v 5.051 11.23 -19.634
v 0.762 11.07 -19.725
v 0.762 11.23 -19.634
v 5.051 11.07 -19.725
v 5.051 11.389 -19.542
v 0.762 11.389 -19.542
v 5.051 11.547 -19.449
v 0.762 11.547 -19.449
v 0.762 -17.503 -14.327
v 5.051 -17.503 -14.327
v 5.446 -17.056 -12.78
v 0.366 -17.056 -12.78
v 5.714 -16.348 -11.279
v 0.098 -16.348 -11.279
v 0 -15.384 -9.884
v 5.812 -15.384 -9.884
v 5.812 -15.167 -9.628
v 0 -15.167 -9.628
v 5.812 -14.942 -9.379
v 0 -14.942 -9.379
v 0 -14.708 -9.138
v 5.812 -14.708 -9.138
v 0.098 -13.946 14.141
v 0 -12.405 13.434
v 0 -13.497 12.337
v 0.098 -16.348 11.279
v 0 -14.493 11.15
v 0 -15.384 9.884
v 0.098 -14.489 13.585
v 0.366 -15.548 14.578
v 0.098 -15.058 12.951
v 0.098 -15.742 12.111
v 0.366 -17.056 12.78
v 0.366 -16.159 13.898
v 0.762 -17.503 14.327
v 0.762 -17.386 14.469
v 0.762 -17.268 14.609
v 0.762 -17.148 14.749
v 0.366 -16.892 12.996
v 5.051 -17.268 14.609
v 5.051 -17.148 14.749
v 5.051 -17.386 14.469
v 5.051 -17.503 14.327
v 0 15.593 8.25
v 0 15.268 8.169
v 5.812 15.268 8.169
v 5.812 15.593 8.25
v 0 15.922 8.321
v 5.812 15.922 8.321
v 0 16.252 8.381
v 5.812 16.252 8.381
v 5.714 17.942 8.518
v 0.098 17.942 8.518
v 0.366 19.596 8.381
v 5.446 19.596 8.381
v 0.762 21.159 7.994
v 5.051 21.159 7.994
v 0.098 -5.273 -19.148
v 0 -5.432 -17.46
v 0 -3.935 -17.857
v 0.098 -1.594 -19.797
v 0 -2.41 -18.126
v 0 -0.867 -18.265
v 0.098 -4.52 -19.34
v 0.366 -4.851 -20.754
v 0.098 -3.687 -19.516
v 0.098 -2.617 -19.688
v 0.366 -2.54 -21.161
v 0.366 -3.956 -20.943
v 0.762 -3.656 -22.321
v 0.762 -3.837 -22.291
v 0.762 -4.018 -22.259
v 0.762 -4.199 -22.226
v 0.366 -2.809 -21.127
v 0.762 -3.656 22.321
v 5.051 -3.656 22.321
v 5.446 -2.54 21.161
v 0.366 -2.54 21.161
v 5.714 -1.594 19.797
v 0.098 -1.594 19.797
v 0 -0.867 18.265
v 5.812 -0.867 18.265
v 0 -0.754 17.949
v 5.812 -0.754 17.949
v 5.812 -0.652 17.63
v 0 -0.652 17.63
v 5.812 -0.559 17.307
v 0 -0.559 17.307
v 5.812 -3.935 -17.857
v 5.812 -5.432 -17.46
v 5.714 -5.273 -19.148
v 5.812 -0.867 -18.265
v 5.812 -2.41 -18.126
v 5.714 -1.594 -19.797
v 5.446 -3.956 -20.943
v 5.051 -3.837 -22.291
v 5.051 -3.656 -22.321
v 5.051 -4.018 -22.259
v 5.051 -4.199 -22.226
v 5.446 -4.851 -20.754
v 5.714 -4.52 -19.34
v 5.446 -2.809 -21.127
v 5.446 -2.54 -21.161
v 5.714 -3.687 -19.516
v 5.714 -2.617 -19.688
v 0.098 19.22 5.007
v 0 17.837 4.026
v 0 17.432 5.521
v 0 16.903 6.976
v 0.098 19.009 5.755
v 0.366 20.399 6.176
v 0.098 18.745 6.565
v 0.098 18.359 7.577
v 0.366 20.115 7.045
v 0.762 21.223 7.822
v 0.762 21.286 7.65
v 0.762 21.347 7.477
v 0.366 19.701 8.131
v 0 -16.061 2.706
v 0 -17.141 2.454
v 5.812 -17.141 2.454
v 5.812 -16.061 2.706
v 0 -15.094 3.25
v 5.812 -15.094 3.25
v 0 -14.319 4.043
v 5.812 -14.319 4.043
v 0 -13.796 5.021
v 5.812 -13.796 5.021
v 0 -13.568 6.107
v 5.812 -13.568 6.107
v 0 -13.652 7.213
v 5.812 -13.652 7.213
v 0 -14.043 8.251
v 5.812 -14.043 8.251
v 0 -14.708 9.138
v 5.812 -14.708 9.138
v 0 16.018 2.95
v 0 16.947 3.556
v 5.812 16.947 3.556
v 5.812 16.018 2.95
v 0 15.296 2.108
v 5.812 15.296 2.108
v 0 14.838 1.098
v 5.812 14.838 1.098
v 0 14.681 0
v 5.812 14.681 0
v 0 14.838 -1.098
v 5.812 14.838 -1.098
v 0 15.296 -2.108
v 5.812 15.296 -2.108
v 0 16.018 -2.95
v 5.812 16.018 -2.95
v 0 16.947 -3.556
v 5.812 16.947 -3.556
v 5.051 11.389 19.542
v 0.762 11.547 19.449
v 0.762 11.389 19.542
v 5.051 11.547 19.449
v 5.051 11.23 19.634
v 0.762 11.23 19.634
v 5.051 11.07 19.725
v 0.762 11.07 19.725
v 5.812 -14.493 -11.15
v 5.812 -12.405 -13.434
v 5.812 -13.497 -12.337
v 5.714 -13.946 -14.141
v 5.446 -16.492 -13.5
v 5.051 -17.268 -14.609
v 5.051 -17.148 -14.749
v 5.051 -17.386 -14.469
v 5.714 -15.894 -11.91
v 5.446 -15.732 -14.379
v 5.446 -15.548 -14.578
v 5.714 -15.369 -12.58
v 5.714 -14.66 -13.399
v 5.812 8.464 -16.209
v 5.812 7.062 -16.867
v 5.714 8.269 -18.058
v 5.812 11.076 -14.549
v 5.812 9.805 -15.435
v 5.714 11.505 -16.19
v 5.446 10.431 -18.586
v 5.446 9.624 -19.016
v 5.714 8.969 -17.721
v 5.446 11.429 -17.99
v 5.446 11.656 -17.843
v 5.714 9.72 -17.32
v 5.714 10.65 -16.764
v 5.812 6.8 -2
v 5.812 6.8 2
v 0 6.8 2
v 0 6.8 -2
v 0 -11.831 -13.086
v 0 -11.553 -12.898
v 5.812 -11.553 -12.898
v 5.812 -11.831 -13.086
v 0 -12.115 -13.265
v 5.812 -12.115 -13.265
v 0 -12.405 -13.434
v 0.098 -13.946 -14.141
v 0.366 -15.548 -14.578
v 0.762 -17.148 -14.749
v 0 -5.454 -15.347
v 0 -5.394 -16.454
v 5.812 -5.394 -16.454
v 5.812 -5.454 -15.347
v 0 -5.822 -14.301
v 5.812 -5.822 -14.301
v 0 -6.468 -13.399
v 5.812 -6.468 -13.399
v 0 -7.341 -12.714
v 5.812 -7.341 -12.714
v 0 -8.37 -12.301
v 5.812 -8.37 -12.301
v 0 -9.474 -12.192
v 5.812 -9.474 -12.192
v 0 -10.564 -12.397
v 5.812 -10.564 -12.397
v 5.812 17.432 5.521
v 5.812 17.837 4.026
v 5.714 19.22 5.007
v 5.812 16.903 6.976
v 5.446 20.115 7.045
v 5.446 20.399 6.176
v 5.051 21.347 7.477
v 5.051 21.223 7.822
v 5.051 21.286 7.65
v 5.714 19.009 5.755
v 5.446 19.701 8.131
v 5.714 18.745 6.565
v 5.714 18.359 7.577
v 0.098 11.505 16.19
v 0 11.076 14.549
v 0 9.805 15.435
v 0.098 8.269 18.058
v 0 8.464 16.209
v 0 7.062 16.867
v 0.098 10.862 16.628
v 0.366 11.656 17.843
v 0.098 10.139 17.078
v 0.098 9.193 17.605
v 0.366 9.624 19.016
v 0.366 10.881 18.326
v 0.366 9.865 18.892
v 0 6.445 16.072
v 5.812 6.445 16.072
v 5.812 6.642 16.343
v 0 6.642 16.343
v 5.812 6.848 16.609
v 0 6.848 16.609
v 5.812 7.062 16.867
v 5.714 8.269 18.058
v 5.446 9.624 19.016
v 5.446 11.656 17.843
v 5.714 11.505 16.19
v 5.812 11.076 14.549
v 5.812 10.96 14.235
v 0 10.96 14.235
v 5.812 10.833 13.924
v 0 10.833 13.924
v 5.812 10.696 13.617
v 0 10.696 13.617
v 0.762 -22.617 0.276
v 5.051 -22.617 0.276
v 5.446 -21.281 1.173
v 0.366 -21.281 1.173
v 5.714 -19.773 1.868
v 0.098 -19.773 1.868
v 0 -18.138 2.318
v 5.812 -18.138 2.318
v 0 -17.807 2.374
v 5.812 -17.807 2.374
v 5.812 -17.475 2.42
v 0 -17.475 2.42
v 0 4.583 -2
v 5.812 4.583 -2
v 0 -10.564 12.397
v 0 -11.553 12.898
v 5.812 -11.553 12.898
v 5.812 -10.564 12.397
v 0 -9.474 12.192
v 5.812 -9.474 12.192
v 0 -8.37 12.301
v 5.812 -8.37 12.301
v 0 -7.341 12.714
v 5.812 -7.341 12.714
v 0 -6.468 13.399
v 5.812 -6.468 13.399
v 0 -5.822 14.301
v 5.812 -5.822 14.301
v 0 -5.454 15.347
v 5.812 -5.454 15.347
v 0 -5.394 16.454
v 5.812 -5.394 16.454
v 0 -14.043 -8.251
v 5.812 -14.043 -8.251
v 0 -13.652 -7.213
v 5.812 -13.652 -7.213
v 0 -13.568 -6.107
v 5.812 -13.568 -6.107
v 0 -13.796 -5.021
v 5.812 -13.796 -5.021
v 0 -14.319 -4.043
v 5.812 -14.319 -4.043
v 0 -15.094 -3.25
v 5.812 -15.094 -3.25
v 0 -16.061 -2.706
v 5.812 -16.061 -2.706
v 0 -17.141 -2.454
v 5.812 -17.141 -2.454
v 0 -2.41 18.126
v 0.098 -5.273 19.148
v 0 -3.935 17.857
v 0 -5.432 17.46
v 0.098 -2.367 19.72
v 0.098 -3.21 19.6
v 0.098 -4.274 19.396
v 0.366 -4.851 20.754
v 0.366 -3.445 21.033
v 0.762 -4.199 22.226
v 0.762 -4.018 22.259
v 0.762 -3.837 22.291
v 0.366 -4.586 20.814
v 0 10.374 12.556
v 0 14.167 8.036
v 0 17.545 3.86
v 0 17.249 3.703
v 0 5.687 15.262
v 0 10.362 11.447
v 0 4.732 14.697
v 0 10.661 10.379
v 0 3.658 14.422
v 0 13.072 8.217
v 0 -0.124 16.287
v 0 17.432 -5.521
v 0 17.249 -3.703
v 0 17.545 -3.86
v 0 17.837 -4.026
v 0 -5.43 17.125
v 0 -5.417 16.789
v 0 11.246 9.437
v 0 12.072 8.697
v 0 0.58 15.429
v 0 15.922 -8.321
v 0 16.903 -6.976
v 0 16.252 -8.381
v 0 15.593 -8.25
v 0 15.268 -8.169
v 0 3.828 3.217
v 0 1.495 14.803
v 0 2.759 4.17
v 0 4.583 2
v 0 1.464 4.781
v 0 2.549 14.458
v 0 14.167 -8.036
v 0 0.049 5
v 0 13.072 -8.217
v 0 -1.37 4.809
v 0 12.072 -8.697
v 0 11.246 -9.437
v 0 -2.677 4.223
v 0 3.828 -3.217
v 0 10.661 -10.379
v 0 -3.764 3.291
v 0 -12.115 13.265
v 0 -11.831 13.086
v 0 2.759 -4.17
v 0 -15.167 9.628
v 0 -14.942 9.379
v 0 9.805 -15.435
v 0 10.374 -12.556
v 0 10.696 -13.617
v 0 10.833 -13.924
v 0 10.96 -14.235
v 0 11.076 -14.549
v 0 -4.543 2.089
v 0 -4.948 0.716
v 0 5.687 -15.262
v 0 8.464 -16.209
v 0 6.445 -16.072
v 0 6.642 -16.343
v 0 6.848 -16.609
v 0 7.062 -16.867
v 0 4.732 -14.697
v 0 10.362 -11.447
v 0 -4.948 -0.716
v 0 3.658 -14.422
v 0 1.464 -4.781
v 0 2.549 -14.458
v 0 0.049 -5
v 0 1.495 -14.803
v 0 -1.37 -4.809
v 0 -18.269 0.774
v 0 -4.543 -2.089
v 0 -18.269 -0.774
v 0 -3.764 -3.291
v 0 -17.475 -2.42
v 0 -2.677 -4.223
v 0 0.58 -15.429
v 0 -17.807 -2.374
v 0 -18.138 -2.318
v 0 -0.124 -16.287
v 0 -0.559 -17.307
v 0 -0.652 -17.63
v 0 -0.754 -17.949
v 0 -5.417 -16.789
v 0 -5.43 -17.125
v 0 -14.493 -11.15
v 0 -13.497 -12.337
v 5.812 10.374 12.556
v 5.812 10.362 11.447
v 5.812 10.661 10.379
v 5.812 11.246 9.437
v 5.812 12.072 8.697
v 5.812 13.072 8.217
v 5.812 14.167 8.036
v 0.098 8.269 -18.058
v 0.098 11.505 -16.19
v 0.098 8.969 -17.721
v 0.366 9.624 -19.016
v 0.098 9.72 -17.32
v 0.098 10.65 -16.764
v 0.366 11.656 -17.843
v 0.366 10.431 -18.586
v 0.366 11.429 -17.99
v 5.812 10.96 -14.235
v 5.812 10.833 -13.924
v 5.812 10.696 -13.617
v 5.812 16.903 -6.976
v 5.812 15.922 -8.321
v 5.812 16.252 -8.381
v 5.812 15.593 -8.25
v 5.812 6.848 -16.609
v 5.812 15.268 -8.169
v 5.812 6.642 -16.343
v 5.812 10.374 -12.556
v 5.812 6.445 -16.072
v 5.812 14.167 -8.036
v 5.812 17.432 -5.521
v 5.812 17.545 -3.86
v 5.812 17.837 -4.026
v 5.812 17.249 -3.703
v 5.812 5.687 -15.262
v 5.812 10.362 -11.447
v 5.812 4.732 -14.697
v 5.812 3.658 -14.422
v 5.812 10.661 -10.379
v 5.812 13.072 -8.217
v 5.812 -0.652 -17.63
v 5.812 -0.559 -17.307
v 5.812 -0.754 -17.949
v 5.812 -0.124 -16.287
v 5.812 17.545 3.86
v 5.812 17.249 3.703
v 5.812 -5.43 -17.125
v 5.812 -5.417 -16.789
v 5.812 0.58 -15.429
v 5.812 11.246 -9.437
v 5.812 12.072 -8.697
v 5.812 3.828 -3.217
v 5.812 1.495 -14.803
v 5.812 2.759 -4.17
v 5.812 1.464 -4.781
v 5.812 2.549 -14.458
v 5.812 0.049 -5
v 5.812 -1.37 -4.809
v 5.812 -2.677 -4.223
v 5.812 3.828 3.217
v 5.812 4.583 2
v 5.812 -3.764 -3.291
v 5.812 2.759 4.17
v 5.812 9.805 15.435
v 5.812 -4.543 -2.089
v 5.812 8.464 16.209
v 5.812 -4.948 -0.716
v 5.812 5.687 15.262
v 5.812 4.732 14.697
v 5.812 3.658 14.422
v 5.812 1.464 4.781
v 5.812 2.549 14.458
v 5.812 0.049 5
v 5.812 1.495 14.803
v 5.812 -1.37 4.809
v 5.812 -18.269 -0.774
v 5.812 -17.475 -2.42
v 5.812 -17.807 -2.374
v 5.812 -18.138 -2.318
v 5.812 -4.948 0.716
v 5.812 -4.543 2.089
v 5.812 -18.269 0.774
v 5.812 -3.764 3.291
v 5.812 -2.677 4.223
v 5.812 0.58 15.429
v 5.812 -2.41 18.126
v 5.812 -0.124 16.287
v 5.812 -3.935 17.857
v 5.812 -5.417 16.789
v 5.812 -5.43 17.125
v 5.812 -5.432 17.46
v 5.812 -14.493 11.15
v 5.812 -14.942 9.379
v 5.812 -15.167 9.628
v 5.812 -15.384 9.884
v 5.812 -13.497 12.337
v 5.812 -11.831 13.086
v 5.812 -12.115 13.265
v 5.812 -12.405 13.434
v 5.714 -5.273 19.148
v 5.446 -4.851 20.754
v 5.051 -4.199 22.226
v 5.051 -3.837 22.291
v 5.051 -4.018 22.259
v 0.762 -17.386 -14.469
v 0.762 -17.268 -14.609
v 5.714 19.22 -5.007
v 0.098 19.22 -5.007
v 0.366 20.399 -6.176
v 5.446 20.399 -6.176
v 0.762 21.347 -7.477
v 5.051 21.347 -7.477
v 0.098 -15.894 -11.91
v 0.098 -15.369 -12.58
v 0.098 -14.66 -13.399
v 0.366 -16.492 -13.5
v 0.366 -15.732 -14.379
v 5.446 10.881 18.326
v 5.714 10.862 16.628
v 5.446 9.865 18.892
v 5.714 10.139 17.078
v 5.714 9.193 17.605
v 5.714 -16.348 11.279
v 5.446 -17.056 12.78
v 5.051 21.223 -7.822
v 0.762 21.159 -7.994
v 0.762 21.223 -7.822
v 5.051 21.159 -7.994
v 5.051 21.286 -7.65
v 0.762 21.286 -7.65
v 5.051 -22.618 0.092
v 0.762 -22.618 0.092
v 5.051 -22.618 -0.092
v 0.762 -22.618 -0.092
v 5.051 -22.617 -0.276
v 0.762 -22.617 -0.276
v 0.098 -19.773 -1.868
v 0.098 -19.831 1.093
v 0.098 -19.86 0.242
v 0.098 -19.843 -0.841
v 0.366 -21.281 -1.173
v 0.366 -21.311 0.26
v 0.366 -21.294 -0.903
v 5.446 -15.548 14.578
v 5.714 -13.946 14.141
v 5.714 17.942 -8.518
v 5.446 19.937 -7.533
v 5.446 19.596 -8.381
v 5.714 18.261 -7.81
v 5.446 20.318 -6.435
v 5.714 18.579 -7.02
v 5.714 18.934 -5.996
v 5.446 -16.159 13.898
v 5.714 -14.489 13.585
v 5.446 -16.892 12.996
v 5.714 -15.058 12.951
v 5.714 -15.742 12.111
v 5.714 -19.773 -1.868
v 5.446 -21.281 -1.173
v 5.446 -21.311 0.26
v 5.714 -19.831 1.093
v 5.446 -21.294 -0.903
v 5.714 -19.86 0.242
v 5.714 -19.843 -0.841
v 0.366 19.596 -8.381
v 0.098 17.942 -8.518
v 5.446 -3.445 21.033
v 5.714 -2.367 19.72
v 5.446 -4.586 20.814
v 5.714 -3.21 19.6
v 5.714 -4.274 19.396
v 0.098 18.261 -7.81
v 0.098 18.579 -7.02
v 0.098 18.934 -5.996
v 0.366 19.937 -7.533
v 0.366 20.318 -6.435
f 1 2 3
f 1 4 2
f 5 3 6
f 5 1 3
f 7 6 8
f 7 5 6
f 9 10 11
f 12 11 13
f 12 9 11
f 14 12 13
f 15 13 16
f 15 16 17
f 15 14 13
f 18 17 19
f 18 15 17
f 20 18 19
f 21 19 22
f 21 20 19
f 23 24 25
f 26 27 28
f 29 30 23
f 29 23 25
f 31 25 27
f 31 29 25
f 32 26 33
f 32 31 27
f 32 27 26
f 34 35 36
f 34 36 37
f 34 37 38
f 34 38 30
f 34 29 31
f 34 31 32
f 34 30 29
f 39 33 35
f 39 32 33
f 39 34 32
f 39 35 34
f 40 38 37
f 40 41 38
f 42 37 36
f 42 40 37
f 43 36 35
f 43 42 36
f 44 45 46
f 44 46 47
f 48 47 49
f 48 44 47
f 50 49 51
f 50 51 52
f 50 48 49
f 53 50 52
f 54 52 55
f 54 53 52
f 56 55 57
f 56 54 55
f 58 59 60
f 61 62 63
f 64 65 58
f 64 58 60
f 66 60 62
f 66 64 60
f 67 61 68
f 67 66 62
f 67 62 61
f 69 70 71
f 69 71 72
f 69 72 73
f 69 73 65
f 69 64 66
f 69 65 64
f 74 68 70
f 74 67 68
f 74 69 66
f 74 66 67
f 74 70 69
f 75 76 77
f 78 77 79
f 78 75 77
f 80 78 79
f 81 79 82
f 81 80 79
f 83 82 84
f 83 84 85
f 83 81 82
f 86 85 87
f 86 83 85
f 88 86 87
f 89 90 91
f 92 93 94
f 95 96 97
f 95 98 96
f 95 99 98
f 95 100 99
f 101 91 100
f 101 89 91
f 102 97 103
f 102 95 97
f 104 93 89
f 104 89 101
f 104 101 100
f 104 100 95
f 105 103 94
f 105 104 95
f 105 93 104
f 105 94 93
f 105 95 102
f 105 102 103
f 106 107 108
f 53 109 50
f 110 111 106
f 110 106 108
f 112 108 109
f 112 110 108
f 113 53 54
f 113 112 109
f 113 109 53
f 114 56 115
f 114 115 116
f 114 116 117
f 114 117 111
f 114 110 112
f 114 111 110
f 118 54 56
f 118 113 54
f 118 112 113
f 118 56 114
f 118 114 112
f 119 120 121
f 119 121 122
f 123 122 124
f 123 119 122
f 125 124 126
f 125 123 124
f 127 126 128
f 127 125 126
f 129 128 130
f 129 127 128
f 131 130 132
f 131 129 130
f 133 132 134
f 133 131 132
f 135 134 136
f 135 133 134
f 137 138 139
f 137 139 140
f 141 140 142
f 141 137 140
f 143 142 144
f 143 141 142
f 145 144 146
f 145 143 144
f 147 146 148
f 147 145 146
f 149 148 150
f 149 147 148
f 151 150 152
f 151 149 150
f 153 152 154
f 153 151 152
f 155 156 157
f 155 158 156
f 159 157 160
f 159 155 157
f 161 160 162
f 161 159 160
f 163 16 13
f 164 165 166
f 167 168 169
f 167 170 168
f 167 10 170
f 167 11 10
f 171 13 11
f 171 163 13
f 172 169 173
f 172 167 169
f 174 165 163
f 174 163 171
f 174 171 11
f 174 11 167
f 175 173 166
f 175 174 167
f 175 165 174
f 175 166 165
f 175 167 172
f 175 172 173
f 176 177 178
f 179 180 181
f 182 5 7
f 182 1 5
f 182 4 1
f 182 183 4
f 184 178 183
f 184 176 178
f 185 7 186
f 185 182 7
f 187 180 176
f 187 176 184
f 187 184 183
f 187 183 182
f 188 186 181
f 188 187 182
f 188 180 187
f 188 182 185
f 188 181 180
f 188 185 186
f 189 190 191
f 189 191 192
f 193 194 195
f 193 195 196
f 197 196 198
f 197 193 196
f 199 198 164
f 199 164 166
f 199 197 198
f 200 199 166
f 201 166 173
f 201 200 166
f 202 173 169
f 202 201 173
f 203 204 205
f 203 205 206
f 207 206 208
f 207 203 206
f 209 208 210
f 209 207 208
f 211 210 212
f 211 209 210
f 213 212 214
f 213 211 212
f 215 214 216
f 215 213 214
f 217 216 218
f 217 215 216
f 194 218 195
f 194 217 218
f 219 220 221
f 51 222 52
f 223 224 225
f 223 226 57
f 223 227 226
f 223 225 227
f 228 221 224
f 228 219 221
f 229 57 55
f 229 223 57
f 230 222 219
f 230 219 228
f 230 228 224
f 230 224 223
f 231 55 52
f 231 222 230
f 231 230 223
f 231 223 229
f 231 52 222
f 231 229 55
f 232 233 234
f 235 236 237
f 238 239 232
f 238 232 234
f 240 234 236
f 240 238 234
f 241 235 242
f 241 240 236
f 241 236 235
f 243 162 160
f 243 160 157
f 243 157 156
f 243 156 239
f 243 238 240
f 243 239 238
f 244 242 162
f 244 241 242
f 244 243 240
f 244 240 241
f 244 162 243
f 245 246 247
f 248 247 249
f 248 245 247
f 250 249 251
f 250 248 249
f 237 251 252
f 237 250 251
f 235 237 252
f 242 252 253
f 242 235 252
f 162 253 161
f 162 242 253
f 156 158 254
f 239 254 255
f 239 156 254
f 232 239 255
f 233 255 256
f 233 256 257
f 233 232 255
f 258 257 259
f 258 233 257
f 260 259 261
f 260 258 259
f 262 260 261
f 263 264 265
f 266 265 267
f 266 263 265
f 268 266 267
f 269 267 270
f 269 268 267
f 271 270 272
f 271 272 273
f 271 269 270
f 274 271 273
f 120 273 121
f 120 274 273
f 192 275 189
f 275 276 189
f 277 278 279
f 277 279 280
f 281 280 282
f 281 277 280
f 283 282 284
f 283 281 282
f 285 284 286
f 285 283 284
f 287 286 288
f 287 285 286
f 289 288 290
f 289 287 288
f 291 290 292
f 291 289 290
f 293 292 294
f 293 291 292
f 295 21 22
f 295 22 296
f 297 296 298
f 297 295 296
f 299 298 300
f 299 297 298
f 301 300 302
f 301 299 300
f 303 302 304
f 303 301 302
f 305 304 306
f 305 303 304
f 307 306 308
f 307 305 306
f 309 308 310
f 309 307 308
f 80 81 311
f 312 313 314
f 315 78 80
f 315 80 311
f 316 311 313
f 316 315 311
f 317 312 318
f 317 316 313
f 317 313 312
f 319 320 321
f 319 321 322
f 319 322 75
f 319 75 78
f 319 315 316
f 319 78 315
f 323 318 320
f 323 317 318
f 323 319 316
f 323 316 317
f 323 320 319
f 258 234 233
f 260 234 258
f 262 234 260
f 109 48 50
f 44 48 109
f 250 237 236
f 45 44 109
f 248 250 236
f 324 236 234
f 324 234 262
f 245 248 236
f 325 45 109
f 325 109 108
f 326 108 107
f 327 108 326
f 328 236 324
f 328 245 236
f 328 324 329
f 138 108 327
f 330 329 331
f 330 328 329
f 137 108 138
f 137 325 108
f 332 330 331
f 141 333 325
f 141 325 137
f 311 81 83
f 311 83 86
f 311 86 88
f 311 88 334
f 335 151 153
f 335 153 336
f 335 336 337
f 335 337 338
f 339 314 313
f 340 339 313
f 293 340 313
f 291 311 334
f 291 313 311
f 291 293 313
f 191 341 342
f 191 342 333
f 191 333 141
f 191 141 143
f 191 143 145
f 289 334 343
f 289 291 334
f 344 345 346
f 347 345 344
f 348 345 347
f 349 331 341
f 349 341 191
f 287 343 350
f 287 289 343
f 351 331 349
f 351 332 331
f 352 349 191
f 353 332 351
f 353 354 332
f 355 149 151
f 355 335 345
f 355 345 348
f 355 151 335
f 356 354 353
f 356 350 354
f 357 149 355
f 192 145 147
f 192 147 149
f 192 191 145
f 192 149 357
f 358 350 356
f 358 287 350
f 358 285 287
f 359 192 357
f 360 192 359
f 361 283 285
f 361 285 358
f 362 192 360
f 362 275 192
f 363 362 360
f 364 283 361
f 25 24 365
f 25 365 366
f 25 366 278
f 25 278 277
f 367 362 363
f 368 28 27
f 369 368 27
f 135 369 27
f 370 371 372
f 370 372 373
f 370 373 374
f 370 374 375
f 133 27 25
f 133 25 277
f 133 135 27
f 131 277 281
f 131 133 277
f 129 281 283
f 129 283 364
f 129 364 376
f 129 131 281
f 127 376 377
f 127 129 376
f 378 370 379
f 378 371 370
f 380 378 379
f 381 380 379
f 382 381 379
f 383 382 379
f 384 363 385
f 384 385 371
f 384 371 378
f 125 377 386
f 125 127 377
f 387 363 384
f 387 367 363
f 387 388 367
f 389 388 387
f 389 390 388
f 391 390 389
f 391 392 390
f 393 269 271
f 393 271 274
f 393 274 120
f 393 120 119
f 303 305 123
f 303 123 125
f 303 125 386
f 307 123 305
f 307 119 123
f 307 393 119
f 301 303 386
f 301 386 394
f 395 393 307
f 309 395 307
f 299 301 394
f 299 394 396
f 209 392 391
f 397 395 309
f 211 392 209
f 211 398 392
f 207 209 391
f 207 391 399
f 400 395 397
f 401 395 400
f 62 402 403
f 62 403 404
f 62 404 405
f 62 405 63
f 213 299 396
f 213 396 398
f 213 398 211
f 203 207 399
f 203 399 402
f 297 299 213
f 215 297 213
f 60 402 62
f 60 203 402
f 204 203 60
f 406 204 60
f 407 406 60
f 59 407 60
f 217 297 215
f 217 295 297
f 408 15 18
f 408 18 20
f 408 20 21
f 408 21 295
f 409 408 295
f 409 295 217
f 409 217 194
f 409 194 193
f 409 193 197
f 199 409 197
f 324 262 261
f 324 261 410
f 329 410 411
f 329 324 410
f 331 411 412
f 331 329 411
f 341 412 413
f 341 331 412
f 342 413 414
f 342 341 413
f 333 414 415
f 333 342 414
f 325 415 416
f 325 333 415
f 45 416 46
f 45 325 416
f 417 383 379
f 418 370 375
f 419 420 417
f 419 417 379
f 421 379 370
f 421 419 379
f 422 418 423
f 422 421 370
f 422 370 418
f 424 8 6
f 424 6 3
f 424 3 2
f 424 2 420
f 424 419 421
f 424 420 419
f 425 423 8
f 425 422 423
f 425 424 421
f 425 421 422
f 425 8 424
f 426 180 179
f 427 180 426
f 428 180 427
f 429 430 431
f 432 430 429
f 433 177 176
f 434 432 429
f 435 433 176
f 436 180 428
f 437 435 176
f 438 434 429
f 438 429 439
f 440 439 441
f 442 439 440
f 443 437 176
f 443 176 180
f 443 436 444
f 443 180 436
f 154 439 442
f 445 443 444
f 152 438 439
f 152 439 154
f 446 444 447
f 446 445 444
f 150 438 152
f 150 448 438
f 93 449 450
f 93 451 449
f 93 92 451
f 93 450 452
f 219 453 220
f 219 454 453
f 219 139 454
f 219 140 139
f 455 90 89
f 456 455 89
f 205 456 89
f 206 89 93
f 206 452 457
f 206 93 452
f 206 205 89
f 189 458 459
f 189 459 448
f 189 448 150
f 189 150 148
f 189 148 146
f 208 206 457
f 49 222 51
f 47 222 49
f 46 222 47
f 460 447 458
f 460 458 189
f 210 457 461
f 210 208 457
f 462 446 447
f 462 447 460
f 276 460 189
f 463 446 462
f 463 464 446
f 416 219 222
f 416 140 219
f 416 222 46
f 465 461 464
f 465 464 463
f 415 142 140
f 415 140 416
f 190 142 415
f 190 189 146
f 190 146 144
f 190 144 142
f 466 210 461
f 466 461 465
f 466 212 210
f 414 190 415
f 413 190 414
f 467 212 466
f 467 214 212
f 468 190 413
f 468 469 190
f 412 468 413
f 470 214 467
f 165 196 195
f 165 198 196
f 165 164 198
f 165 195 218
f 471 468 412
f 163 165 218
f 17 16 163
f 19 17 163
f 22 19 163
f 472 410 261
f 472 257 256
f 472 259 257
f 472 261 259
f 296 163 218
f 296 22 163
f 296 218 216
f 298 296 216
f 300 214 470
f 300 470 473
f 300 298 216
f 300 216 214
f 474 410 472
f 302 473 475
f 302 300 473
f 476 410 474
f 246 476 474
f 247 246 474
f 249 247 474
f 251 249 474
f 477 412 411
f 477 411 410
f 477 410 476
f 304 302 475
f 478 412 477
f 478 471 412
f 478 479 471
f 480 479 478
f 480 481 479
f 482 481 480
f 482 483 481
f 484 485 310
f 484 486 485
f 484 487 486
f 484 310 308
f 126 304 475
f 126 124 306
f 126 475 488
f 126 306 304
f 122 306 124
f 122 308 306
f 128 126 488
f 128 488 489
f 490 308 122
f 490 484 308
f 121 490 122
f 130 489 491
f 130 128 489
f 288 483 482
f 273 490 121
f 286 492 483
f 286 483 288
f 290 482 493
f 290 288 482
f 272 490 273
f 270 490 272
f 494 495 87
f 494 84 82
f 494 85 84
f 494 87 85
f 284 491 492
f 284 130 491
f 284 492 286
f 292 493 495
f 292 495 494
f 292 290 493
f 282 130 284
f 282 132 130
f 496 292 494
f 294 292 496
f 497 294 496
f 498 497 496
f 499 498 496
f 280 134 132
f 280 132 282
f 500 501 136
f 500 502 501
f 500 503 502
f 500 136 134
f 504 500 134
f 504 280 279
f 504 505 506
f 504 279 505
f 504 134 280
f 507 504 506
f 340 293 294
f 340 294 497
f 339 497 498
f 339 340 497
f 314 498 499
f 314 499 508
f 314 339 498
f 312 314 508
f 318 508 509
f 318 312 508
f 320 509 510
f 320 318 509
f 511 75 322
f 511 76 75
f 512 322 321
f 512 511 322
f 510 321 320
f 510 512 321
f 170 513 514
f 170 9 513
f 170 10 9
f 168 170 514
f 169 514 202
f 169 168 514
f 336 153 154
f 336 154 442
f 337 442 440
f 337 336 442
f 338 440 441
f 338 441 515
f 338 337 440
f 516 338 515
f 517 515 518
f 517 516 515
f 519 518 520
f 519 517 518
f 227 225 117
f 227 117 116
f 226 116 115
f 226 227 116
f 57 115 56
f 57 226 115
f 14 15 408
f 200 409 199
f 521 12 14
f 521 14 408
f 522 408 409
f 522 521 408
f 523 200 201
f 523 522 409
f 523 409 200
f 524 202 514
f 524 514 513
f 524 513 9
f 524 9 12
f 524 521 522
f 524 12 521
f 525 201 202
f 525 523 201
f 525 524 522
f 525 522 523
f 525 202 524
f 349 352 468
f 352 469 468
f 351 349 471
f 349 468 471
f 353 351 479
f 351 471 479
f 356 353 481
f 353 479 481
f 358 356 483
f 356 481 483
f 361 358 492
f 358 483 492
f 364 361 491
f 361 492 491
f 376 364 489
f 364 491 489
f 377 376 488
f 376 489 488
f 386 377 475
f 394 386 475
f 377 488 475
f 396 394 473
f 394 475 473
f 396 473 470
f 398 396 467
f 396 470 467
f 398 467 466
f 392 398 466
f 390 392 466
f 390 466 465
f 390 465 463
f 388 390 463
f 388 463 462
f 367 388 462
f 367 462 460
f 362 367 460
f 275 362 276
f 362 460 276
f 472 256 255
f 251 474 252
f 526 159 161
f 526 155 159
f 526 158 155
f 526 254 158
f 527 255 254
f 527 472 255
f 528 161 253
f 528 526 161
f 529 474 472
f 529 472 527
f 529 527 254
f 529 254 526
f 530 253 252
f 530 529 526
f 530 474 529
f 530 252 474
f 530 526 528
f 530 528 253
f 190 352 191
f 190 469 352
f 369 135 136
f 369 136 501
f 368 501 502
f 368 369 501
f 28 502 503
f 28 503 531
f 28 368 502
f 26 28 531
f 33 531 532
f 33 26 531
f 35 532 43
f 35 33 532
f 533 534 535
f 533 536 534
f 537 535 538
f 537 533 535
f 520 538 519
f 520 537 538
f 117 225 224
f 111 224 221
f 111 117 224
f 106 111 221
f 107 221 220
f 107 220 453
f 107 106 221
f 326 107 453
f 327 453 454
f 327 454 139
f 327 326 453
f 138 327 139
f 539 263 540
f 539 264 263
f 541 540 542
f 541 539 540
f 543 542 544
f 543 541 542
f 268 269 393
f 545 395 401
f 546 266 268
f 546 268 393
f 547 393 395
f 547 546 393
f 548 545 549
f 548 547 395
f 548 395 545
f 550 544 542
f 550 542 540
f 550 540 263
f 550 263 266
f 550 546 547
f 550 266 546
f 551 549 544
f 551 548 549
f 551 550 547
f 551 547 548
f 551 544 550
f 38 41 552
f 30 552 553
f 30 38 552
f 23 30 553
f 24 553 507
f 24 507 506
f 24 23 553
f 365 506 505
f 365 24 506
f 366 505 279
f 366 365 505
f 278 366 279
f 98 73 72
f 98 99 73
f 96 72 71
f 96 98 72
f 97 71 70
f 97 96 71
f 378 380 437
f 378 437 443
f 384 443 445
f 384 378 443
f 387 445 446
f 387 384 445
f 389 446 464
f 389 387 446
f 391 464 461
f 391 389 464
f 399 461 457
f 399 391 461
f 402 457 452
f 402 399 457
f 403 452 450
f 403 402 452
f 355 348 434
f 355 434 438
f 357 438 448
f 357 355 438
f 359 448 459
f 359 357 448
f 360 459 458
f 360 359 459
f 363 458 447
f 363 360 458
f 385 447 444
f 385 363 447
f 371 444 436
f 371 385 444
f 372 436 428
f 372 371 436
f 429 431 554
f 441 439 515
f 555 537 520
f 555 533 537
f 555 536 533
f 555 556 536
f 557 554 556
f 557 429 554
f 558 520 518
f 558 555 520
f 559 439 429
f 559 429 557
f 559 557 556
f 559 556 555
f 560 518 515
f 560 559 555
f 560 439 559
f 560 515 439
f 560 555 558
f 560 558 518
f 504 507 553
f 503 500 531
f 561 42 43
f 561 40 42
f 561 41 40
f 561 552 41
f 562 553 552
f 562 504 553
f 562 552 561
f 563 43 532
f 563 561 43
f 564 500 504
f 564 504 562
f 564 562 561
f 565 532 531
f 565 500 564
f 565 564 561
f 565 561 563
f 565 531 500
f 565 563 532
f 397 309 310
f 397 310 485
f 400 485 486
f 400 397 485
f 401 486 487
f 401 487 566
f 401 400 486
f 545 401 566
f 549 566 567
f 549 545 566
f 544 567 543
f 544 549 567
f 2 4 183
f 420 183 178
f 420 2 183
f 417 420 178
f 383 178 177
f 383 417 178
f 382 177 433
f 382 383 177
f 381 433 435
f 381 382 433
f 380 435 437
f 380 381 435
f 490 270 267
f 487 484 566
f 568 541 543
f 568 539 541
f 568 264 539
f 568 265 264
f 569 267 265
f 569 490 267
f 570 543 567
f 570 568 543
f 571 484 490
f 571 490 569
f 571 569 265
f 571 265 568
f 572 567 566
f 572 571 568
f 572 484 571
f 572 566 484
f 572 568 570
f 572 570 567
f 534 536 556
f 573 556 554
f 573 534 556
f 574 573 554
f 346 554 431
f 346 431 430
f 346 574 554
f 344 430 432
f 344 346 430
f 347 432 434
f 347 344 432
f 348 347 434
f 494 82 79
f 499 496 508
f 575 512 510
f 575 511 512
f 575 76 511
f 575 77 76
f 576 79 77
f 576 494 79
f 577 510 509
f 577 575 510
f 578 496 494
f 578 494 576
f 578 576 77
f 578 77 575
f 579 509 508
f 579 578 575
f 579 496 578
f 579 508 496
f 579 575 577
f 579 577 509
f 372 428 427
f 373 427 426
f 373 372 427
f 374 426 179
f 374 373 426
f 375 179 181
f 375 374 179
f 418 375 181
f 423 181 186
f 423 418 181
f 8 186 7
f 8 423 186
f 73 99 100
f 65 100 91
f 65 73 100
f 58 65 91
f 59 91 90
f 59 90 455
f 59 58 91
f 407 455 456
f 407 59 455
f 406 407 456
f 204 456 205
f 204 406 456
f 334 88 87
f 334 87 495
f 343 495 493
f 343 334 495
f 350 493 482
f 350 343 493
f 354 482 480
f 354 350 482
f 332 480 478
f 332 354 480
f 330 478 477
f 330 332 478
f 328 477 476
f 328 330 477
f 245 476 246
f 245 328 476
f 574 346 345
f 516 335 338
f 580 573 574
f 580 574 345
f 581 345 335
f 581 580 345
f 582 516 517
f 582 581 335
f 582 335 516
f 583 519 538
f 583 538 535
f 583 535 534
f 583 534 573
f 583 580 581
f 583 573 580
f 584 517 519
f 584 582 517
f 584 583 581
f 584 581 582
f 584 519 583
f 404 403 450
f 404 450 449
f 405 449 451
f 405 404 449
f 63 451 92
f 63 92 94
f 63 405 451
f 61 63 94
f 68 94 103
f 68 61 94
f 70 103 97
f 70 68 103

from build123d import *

# Parameters (mm, degrees)
TOOTHCUT_DEPTH  = 33.511421565
TEETHCUTS_COUNT = 9
TEETHCUTS_ANGLE = 320
BORSKE_R        = 5
BORE_DEPTH      = 50.0005
KEYSKE_W        = 4
KEYSKE_H        = 6.8
KEYWAY_DEPTH    = 50.0005


with BuildPart() as part:
    # BasProSke → Base-Revolve (revolve)
    with BuildSketch(Plane(origin=(0, 0, 0), x_dir=(1, 0, 0), z_dir=(0, 1, 0)), mode=Mode.PRIVATE) as base_revolve_sk:
        with BuildLine():
            Line((0, 0), (0, 18.285742546))
            ThreePointArc((0, 18.285742546), (0.191950592, 20.485447071), (0.762, 22.618657961))
            Line((0.762, 22.618657961), (5.0505, 22.618657961))
            ThreePointArc((5.0505, 22.618657961), (5.620549408, 20.485447071), (5.8125, 18.285742546))
            Line((5.8125, 18.285742546), (5.8125, 0))
            Line((5.8125, 0), (0, 0))
        make_face()
    revolve(base_revolve_sk.sketch.rotate(Axis((-10, 0, 0), (1, 0, 0)), 180), axis=Axis((-10, 0, 0), (1, 0, 0)))

    # TooCutSke → ToothCut (cut, through all)
    with BuildSketch(Plane(origin=(0, 0, 0), x_dir=(0, 0, -1), z_dir=(1, 0, 0))):
        with BuildLine():
            ThreePointArc((3.55621581, 16.946717295), (5.415747479, 19.676223939), (8.046347206, 21.673224093))
            ThreePointArc((8.046347206, 21.673224093), (0, 23.118657961), (-8.046347206, 21.673224093))
            ThreePointArc((-8.046347206, 21.673224093), (-5.415747479, 19.676223939), (-3.55621581, 16.946717295))
            ThreePointArc((-3.55621581, 16.946717295), (0, 14.681157961), (3.55621581, 16.946717295))
        make_face()
    toothcut = extrude(amount=TOOTHCUT_DEPTH, mode=Mode.SUBTRACT)

    # TeethCuts: ToothCut ×9 about axis
    teethcuts_axis = Axis((-10, 0, 0), (1, 0, 0))
    for i in range(1, TEETHCUTS_COUNT):
        add(toothcut.rotate(teethcuts_axis, i * TEETHCUTS_ANGLE / (TEETHCUTS_COUNT - 1)), mode=Mode.SUBTRACT)

    # BorSke → Bore (cut, symmetric)
    with BuildSketch(Plane(origin=(0, 0, 0), x_dir=(0, 0, -1), z_dir=(1, 0, 0))):
        with Locations(Location((0, 0, 0), (0, 0, 180))):
            Circle(BORSKE_R)
    extrude(amount=BORE_DEPTH, both=True, mode=Mode.SUBTRACT)

    # KeySke → Keyway (cut, symmetric)
    with BuildSketch(Plane(origin=(0, 0, 0), x_dir=(0, 0, -1), z_dir=(1, 0, 0))):
        with Locations((0, 3.4)):
            Rectangle(KEYSKE_W, KEYSKE_H)
    extrude(amount=KEYWAY_DEPTH, both=True, mode=Mode.SUBTRACT)


solid = part.part
